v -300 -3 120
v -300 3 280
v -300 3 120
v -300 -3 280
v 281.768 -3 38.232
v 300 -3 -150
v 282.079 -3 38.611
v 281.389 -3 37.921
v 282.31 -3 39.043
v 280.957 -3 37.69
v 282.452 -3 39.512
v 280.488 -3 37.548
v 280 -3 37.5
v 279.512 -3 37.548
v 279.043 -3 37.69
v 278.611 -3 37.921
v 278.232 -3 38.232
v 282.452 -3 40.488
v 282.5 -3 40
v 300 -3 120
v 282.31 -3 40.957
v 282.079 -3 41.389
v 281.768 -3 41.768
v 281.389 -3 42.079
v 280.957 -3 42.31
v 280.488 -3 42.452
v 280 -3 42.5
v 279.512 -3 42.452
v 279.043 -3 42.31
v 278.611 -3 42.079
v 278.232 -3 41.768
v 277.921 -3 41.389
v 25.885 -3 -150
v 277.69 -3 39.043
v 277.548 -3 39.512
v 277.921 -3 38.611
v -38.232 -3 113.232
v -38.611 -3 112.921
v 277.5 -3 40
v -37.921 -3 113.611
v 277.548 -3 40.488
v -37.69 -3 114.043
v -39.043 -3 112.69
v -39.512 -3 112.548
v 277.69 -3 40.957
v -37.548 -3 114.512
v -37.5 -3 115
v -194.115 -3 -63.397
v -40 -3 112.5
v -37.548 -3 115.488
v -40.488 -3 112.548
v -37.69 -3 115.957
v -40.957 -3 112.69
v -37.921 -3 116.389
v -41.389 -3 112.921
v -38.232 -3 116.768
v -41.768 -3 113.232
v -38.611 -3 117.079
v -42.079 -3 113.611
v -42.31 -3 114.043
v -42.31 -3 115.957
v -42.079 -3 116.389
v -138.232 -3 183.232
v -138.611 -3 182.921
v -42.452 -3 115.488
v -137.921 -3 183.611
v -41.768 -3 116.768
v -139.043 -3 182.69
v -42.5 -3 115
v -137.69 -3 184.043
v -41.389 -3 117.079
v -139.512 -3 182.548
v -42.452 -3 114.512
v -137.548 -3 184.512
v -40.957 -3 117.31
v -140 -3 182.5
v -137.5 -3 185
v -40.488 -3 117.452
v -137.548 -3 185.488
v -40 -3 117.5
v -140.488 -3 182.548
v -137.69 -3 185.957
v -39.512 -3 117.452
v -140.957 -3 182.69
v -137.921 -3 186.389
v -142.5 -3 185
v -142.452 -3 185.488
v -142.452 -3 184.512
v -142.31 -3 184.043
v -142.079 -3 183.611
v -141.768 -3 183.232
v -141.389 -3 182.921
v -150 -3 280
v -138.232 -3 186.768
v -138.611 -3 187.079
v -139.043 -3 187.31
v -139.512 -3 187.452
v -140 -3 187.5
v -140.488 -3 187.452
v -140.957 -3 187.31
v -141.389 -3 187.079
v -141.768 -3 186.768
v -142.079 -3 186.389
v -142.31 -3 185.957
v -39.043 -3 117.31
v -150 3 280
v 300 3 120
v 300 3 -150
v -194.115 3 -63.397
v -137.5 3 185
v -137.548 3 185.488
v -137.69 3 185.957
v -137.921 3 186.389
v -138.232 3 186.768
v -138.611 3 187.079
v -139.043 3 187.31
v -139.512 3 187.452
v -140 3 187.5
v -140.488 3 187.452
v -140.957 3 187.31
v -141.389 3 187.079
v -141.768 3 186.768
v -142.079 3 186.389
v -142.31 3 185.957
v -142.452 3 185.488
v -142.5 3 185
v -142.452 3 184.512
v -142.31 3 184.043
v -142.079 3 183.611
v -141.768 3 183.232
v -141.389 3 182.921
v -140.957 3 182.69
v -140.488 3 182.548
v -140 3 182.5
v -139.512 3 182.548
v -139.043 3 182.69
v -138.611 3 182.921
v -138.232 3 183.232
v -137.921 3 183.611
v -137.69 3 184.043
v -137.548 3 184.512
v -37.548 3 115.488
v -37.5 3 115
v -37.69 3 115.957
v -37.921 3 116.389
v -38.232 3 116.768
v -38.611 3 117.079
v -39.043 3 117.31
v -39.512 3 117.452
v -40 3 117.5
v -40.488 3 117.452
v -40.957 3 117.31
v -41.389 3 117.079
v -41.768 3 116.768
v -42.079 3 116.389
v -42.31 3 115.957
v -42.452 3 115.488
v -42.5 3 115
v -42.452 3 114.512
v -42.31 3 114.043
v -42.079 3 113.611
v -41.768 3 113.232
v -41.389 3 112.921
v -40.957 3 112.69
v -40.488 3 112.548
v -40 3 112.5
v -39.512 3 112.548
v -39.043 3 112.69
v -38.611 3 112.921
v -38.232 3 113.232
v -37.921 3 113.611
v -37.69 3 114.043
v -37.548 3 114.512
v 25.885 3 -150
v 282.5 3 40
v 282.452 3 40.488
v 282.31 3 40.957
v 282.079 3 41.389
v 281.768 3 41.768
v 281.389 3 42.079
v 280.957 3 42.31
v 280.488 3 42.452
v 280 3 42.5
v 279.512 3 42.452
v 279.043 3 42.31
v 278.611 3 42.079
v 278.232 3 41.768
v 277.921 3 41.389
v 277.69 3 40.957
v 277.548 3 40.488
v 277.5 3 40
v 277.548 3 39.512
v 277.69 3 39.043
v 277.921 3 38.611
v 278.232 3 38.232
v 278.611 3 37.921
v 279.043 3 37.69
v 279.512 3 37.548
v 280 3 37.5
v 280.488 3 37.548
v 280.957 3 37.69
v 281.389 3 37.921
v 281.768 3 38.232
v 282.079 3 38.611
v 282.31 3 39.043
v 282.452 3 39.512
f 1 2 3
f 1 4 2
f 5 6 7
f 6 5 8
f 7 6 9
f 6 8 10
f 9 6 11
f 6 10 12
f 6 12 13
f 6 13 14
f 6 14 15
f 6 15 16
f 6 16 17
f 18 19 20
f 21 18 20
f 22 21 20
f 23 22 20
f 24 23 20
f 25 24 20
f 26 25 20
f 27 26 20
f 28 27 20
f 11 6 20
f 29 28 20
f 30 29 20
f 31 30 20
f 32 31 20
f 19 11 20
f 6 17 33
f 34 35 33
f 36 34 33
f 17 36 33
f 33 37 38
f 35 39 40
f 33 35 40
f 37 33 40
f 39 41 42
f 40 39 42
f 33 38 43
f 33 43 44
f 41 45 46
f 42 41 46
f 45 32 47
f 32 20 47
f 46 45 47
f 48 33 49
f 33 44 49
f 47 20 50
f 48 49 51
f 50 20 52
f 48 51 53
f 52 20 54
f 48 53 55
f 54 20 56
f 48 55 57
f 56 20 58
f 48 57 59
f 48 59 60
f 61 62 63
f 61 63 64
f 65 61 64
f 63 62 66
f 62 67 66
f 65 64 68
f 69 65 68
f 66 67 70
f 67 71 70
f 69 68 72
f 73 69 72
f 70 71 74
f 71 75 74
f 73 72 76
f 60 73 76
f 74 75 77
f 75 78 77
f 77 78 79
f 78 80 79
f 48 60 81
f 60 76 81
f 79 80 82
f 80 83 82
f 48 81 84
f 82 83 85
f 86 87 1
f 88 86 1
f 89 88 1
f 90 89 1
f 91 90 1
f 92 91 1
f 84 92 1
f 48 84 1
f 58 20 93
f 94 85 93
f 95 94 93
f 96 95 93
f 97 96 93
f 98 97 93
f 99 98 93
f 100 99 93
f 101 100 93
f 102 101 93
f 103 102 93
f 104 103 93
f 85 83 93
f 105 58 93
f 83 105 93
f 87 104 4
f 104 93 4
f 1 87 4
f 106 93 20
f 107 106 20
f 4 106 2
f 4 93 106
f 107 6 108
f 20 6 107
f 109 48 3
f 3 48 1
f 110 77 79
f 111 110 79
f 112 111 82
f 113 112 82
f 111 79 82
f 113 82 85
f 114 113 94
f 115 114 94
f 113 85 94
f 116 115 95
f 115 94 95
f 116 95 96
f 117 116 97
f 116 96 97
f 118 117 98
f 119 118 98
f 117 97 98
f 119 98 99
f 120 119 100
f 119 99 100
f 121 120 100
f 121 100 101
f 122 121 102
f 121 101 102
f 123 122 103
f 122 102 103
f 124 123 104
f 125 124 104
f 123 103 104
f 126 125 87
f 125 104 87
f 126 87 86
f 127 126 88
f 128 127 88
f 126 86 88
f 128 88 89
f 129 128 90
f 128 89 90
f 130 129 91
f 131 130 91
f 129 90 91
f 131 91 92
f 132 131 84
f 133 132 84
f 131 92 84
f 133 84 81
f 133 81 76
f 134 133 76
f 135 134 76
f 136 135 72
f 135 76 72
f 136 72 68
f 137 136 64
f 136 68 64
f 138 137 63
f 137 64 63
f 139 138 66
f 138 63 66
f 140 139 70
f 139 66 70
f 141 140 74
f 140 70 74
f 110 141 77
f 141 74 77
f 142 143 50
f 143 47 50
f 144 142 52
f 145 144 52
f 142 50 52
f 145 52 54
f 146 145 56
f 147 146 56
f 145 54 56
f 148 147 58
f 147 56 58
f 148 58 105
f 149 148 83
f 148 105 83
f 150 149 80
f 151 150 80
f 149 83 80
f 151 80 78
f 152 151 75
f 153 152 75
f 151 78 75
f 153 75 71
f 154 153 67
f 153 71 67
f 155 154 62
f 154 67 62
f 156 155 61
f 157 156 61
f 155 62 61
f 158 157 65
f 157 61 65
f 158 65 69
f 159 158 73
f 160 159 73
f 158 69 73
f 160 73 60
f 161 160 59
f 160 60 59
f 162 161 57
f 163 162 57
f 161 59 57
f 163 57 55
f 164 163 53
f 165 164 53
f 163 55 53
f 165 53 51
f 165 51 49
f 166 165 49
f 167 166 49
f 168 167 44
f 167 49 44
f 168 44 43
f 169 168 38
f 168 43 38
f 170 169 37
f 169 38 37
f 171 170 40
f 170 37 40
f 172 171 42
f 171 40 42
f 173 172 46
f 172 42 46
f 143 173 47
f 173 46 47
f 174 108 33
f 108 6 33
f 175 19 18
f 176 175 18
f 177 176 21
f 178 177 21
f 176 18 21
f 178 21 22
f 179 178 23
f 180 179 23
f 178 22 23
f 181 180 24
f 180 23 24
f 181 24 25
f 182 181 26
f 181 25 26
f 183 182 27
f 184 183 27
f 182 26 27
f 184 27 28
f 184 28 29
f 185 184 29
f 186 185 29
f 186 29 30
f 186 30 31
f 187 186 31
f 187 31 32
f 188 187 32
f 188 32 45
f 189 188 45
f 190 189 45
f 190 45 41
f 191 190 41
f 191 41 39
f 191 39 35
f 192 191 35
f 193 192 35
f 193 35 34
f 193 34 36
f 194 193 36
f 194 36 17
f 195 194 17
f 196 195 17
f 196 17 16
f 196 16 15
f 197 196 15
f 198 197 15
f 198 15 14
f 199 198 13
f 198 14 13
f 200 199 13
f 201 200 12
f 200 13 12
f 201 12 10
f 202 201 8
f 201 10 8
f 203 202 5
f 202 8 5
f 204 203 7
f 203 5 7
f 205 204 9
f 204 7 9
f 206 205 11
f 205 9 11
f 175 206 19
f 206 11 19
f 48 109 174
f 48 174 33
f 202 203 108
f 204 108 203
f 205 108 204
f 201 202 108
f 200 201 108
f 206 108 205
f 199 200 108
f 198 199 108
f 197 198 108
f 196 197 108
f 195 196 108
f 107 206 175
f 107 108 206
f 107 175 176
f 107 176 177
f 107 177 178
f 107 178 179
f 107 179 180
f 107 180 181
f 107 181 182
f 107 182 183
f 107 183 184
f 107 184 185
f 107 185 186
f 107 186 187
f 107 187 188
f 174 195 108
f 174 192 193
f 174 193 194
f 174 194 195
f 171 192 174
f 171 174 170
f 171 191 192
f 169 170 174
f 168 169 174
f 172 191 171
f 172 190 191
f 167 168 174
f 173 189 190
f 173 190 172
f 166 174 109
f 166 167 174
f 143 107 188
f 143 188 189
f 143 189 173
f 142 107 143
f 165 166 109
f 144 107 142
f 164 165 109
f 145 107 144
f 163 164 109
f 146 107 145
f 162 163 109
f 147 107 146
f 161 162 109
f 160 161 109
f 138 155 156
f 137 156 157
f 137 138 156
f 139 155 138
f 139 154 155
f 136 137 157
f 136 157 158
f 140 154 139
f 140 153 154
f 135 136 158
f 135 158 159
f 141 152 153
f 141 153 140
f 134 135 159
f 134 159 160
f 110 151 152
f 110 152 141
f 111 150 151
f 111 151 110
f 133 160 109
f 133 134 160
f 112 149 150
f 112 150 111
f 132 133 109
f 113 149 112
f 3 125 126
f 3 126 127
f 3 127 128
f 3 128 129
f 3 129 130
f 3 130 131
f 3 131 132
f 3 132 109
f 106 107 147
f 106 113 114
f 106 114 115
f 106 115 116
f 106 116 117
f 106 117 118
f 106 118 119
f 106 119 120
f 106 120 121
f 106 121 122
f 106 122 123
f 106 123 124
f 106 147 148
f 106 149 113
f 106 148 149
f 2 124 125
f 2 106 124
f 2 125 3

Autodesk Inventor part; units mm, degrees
ref_plane "YZ Plane" through (0, 0, 0) normal (1, 0, 0) x (0, 1, 0)
ref_plane "XZ Plane" through (0, 0, 0) normal (0, 1, 0) x (-1, 0, 0)
ref_plane "XY Plane" through (0, 0, 0) normal (0, 0, 1) x (1, 0, 0)
sketch "スケッチ1" plane through (0, 0, 0) normal (0, 1, 0) x (-1, 0, 0)
  line L0 (-300, 280) -> (300, 280)
  line L1 (300, 280) -> (300, -280)
  line L2 (300, -280) -> (-300, -280)
  line L3 (-300, -280) -> (-300, 280)
  line L4 (-300, 280) -> (300, -280) construction
  line L5 (300, 280) -> (-300, -280) construction
  point P0 (0, 0)
  dimension "d0" = 600
  dimension "d1" = 560
extrude "押し出し1" add sketch "スケッチ1" along normal mid plane 6
sketch "スケッチ3" plane through (0, -3, 0) normal (0, -1, 0) x (1, 0, 0)
  circle A0 centre (-40, 115) radius 2.5
  line L0 (300, -280) -> (300, 280) projected
  line L1 (-300, -280) -> (300, -280) projected
  circle A1 centre (-140, 185) radius 2.5
  circle A2 centre (280, 40) radius 2.5
  point P0 (0, 0)
  dimension "d10" = 5
  dimension "d15" = 5
  dimension "d16" = 320
  dimension "d17" = 20
  dimension "d18" = 5
  dimension "d24" = 75
  dimension "d25" = 320
  dimension "d26" = 420
  dimension "d27" = 145
extrude "押し出し4" cut sketch "スケッチ3" against normal through all
sketch "スケッチ5" plane through (0, -3, 0) normal (0, -1, 0) x (1, 0, 0)
  line L0 (300, 250) -> (-300, 250)
  line L1 (-250, 280) -> (-250, -280) construction
  line L2 (-300, -250) -> (300, -250)
  line L3 (250, -280) -> (250, 280) construction
  line L4 (-300, 280) -> (300, 280)
  line L5 (-150, 280) -> (300, 120)
  line L6 (300, 280) -> (300, -280)
  line L7 (-300, -280) -> (-300, 280)
  line L8 (-300, 120) -> (-144.115427, -150)
  line L9 (-144.115427, -150) -> (300, -150)
  line L10 (300, -280) -> (300, 280)
  point P0 (0, 0)
  dimension "d32" = 100
  dimension "d33" = 130
  dimension "d34" = 400
  dimension "d35" = 60
  dimension "d46" = 270
sketch "スケッチ5 outline for 押し出し5" plane through (0, -3, 0) normal (0, -1, 0) x (1, 0, 0)
  line L0 (300, 120) -> (300, 280)
  line L1 (-150, 280) -> (300, 120)
  line L2 (300, 280) -> (-150, 280)
  line L3 (-300, 120) -> (-300, -280)
  line L4 (-144.115427, -150) -> (-300, 120)
  line L5 (300, -150) -> (-144.115427, -150)
  line L6 (300, -280) -> (300, -150)
  line L7 (-300, -280) -> (300, -280)
extrude "押し出し5" cut sketch "スケッチ5 outline for 押し出し5" against normal through all
chamfer "面取り2" distance 170 distance2 100 1 edges at (-144.1154, 0, -150) measured on face at (151.9615, -1, -150)
properties part number "endplate" material "CFRP"
